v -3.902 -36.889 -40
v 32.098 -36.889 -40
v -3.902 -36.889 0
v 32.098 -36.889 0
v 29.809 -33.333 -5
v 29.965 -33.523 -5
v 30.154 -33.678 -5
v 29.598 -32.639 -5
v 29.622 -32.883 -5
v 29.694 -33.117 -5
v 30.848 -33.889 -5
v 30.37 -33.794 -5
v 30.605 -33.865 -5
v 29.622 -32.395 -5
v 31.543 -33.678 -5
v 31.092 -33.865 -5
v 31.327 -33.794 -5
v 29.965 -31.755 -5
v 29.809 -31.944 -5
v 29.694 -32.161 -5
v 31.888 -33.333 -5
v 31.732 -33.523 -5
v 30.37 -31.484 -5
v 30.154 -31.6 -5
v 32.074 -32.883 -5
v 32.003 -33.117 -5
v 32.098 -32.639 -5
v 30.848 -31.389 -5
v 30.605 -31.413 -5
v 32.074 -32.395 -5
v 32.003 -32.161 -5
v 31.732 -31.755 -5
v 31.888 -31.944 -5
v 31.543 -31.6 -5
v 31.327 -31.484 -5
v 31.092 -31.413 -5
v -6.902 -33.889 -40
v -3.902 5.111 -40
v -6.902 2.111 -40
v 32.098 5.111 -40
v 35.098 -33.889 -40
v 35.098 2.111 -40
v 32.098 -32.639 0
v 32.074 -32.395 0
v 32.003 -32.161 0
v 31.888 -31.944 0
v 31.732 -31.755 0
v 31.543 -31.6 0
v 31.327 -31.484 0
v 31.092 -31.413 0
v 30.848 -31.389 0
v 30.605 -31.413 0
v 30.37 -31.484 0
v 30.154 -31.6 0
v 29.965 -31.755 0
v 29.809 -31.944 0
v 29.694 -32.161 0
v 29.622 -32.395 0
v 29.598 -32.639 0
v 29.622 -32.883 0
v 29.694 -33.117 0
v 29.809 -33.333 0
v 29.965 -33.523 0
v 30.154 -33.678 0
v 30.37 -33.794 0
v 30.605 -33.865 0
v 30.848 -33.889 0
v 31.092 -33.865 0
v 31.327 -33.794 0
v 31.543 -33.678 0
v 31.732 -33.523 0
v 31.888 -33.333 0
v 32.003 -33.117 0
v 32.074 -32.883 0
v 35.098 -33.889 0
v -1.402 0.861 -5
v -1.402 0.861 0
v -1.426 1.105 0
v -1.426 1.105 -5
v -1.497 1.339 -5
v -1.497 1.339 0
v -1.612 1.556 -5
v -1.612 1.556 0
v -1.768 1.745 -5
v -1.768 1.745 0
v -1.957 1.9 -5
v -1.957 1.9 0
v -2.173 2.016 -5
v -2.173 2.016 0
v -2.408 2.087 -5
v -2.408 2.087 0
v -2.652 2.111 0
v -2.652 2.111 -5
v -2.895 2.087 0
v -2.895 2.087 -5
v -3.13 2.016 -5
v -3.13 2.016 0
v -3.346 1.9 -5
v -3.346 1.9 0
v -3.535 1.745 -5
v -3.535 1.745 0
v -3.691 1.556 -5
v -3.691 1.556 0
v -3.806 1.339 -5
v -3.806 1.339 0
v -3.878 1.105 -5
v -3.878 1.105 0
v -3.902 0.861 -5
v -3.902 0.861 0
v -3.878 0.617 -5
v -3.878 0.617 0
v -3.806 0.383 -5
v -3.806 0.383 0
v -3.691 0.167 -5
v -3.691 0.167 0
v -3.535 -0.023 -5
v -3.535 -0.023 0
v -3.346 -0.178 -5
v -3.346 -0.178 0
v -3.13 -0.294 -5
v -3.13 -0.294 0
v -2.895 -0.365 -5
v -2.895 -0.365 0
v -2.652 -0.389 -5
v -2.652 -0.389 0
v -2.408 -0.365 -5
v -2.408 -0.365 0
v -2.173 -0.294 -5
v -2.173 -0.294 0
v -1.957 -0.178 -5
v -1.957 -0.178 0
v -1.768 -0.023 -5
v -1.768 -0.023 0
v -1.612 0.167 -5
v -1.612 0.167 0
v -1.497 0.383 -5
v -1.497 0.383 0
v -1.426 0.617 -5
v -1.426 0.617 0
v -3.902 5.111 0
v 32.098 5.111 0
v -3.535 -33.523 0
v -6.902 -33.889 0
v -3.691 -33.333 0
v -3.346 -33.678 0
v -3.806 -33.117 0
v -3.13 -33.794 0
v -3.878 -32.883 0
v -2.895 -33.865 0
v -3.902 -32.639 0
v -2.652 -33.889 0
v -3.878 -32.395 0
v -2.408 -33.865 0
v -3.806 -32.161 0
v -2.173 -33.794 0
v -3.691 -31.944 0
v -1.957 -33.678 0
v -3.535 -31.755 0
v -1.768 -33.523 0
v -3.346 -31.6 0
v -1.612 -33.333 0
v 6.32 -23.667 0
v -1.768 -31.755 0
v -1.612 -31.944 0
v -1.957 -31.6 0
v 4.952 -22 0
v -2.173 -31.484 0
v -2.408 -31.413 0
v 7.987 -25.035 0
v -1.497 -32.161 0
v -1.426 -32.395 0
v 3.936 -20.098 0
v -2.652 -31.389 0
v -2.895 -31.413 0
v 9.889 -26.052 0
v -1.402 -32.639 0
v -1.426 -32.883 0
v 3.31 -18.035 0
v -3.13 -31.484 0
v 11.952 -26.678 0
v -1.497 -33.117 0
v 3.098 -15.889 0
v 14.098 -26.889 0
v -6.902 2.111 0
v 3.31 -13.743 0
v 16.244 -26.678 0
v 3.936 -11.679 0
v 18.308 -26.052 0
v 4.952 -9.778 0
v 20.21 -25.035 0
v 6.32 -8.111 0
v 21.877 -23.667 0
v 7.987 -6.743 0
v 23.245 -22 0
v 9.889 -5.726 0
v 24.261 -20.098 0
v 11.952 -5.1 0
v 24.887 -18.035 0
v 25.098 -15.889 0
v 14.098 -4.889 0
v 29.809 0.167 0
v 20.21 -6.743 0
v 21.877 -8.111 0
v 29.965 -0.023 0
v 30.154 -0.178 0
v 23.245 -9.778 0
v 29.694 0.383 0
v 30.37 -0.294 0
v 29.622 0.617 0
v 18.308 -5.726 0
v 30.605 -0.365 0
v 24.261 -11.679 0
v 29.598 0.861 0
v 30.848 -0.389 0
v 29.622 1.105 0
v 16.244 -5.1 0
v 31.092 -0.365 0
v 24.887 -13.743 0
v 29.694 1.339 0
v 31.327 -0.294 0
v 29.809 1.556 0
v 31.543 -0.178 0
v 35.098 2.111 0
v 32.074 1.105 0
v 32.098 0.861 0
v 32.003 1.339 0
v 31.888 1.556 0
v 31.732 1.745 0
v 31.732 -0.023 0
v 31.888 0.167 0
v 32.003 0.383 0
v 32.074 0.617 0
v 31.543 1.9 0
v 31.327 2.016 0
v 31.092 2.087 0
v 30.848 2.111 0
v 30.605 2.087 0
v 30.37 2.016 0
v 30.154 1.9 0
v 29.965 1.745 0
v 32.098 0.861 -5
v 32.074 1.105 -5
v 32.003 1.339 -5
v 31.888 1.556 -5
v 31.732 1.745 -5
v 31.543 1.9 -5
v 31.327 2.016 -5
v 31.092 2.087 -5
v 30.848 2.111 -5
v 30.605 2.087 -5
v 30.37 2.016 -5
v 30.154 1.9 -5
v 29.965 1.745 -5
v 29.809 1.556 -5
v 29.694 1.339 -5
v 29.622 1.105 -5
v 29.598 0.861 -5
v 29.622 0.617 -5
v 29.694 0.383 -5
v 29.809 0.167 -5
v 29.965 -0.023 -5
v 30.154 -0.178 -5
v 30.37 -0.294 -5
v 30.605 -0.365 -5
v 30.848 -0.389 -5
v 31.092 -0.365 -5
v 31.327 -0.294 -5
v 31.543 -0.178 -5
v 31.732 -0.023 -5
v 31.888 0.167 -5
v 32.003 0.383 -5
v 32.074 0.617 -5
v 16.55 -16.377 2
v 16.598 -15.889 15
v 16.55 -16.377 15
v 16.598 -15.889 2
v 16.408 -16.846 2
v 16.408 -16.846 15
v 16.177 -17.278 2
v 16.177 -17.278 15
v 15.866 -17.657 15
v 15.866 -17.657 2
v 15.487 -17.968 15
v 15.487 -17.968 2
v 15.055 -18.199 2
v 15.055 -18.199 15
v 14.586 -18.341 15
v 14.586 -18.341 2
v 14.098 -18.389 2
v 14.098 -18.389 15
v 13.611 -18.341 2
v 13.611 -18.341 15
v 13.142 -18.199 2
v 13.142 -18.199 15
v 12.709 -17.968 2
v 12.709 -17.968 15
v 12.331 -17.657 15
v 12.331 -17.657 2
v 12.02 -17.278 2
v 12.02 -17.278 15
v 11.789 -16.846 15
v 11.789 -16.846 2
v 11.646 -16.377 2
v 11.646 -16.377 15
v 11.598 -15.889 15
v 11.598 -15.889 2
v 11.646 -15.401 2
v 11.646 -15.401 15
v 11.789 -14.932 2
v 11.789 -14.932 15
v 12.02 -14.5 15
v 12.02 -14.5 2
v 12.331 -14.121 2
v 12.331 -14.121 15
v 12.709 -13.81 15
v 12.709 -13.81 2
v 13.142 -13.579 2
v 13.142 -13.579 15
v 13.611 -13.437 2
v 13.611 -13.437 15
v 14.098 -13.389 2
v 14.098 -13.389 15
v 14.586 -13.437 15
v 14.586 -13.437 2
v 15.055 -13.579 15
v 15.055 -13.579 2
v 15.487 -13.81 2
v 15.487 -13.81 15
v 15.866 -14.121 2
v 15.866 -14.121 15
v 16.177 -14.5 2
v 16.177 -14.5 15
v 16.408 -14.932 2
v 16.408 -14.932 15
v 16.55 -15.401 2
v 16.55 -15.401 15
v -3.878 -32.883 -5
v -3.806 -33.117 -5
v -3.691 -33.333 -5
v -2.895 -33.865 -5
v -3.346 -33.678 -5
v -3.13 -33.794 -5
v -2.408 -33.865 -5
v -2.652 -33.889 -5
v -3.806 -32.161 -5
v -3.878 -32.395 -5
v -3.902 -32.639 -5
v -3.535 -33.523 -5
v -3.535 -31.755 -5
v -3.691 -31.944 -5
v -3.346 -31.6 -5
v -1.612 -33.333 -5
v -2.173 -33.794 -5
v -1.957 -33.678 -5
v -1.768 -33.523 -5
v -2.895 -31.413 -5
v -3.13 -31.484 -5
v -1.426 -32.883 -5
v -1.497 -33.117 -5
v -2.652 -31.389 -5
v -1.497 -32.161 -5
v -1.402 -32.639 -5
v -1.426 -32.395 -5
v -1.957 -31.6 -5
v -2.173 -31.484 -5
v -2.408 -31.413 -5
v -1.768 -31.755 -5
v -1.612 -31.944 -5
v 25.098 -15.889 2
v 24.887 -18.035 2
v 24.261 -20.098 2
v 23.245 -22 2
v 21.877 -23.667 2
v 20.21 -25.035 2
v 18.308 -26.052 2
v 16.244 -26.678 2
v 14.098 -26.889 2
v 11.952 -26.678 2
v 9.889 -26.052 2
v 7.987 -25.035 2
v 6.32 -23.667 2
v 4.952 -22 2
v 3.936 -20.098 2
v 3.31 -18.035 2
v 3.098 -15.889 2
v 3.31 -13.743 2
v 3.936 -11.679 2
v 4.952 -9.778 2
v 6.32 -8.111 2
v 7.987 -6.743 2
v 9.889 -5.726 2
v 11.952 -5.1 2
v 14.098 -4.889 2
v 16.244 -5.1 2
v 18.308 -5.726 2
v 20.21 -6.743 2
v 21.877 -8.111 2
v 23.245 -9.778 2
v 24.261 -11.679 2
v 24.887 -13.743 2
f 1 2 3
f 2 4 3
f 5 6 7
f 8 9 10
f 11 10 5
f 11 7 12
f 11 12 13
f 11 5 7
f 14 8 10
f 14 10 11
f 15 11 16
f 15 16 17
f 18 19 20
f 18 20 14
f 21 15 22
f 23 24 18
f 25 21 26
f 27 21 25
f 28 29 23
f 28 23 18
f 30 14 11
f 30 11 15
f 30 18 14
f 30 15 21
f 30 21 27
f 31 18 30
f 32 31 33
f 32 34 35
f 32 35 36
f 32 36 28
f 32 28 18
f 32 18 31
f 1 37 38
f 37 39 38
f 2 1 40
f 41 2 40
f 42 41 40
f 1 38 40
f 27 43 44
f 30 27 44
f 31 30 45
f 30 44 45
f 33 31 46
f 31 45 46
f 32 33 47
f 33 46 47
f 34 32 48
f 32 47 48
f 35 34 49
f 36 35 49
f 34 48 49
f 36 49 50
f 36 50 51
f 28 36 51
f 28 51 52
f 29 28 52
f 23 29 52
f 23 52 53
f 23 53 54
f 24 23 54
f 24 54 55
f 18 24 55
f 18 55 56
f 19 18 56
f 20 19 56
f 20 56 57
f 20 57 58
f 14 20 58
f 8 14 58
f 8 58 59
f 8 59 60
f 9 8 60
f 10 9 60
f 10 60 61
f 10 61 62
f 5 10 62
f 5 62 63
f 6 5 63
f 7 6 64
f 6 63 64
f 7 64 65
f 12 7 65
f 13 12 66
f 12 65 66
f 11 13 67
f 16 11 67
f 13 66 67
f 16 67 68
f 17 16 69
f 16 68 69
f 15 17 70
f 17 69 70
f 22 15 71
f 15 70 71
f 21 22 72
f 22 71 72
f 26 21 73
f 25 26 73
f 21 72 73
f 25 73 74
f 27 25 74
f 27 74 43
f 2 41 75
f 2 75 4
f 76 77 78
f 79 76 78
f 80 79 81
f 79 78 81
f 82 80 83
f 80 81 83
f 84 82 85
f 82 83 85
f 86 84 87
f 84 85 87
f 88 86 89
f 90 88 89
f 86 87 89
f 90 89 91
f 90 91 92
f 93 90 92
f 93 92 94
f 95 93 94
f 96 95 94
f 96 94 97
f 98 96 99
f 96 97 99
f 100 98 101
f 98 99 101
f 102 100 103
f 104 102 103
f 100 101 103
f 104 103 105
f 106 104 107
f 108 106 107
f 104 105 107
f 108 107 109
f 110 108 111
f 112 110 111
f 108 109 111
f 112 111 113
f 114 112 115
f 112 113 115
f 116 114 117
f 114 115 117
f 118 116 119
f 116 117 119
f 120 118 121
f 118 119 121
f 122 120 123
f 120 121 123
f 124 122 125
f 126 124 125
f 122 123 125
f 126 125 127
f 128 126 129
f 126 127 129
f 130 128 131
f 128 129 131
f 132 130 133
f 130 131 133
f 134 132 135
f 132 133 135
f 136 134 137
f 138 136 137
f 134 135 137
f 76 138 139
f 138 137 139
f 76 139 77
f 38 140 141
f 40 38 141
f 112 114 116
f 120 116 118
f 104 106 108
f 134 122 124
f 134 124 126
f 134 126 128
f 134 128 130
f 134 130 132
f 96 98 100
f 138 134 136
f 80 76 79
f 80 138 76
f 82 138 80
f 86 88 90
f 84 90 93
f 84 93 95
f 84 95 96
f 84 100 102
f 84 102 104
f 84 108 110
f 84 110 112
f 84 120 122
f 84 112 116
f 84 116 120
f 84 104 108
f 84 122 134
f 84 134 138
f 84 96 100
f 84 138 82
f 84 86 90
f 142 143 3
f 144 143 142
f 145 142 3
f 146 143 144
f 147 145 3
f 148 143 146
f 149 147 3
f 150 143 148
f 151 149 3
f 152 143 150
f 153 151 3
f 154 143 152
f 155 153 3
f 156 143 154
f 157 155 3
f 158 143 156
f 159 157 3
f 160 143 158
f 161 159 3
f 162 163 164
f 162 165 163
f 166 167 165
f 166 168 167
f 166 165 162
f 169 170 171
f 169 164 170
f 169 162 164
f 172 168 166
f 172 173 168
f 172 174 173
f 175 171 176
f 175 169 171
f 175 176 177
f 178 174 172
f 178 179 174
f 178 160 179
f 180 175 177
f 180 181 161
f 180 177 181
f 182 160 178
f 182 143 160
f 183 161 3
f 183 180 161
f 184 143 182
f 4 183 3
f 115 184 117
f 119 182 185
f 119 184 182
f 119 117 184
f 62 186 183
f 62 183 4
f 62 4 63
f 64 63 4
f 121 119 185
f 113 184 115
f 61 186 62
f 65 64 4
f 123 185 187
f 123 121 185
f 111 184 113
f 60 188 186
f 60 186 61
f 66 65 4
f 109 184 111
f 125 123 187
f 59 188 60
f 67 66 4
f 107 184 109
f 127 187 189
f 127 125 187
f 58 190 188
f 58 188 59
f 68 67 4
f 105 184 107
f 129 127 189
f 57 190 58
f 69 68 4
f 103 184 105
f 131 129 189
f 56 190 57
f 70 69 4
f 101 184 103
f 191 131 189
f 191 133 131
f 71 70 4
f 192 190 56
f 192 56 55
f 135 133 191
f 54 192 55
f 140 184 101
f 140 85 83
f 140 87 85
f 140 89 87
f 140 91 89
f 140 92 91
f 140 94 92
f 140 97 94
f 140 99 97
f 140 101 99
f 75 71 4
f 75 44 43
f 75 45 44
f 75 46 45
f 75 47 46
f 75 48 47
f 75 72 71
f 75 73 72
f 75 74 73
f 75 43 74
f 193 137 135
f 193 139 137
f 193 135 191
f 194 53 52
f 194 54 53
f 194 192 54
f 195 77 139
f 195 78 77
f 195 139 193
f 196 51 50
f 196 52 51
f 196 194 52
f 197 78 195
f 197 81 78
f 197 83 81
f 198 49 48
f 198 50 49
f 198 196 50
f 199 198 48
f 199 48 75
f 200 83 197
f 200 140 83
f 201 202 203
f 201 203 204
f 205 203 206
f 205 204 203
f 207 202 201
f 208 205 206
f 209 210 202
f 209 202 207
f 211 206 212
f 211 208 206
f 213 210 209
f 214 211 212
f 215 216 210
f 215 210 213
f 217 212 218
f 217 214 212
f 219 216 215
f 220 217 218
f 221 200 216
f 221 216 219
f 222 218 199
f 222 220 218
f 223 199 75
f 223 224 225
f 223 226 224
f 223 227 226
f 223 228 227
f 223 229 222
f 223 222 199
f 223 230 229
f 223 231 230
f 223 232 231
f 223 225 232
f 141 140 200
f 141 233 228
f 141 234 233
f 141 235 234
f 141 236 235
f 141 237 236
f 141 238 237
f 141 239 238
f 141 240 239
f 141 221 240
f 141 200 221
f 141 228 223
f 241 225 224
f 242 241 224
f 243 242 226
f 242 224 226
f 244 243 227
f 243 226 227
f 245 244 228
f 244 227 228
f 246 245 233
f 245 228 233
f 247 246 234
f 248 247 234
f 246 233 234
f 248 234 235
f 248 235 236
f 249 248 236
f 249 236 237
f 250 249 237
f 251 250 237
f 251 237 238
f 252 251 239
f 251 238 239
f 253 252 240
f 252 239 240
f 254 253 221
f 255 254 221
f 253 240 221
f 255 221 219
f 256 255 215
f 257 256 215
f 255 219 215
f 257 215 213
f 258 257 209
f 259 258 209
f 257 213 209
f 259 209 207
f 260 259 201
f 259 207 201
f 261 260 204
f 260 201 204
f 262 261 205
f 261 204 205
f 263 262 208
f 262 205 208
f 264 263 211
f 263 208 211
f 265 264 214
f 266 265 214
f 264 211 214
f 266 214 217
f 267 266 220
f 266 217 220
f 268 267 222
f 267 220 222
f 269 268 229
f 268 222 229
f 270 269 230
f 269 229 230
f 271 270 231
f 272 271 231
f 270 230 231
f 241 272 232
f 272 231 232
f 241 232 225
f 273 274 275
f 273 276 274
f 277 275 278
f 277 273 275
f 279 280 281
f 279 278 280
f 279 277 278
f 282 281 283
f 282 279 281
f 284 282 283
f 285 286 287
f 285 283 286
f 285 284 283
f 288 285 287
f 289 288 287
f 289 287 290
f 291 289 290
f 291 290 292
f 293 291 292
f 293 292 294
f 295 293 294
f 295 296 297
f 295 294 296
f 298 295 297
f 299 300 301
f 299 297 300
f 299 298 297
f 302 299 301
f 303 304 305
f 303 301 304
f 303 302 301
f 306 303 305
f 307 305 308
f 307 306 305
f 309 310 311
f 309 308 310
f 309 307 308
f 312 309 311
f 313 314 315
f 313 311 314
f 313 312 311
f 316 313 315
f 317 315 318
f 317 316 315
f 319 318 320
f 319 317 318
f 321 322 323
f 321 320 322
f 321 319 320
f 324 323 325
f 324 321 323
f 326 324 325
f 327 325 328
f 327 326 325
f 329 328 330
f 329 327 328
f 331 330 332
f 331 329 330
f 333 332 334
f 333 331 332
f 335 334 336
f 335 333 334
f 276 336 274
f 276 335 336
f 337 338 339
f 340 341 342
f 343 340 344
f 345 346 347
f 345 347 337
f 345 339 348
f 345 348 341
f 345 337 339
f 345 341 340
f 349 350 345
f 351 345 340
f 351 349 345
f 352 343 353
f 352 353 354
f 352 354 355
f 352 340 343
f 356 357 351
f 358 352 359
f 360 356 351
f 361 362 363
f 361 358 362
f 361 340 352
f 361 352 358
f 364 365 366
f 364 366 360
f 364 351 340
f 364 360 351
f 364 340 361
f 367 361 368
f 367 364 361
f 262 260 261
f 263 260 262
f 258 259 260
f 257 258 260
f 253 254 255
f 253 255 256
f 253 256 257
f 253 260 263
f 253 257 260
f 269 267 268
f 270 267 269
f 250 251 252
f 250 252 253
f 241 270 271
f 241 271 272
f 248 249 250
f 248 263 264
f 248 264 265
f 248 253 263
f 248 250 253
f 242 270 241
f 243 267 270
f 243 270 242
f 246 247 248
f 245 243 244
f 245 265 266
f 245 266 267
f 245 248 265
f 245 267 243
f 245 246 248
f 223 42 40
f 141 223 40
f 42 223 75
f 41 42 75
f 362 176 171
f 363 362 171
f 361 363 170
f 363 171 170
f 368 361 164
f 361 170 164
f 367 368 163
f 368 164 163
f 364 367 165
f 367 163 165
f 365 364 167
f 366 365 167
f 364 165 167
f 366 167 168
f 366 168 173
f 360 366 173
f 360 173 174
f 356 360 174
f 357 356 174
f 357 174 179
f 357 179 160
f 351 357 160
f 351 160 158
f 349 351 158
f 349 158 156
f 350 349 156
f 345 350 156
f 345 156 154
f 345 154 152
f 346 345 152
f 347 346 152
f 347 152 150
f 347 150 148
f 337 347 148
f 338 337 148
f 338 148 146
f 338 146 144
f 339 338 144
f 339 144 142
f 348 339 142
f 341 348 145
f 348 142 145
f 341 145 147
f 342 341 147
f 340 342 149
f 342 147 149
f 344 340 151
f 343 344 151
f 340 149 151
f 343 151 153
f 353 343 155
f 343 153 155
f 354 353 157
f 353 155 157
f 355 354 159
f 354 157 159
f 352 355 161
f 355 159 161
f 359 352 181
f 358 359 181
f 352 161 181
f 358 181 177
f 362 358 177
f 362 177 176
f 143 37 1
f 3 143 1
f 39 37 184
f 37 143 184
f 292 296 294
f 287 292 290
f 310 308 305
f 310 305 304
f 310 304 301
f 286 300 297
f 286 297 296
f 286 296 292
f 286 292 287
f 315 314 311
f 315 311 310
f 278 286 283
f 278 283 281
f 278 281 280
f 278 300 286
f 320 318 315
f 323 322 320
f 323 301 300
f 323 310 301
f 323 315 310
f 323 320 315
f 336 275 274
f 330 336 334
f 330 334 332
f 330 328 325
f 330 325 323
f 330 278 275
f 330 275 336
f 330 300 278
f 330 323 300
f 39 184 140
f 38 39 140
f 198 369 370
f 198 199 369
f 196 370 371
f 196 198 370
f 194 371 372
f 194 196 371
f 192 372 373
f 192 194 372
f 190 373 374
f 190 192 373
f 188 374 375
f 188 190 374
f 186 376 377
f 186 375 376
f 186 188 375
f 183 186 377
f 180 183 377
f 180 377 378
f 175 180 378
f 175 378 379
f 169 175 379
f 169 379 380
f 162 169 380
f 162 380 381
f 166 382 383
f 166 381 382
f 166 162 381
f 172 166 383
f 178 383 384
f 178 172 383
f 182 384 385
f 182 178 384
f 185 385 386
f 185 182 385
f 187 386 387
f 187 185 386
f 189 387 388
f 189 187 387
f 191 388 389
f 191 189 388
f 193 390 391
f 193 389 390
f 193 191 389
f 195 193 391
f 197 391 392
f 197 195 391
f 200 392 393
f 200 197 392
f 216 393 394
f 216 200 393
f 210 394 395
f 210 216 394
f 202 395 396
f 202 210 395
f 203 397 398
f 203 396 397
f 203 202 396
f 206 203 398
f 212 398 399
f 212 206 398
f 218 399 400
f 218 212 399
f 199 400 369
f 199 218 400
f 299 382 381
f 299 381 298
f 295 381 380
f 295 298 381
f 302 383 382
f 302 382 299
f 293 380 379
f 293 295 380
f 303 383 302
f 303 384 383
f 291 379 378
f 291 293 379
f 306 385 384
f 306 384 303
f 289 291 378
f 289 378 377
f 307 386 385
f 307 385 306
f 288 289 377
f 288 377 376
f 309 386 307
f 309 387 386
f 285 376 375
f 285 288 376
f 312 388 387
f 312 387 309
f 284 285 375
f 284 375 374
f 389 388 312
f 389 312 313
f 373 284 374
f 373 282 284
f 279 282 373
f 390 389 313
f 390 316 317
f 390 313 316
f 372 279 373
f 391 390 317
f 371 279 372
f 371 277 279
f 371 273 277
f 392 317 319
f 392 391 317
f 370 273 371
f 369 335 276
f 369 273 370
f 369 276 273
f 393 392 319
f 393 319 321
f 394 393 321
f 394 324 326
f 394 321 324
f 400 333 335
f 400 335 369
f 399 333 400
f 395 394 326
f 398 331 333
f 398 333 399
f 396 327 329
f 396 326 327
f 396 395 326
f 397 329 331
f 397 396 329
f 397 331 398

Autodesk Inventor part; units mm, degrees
ref_plane "YZ Plane" through (0, 0, 0) normal (1, 0, 0) x (0, 1, 0)
ref_plane "XZ Plane" through (0, 0, 0) normal (0, 1, 0) x (-1, 0, 0)
ref_plane "XY Plane" through (0, 0, 0) normal (0, 0, 1) x (1, 0, 0)
sketch "Sketch1" plane through (0, 0, 0) normal (0, 0, 1) x (1, 0, 0)
  line L0 (-3.9016, 5.1111) -> (32.0984, 5.1111)
  line L1 (35.0984, 2.1111) -> (35.0984, -33.8889)
  line L2 (32.0984, -36.8889) -> (-3.9016, -36.8889)
  line L3 (-6.9016, -33.8889) -> (-6.9016, 2.1111)
  circle A0 centre (14.0984, -15.8889) radius 11
  circle A1 centre (14.0984, -15.8889) radius 2.5
  line L4 (35.0984, 2.1111) -> (32.0984, 5.1111)
  line L5 (-6.9016, 2.1111) -> (-3.9016, 5.1111)
  line L6 (-6.9016, -33.8889) -> (-3.9016, -36.8889)
  line L7 (35.0984, -33.8889) -> (32.0984, -36.8889)
  circle A2 centre (30.8484, -32.6389) radius 1.25
  circle A3 centre (-2.6516, -32.6389) radius 1.25
  circle A4 centre (-2.6516, 0.8611) radius 1.25
  circle A5 centre (30.8484, 0.8611) radius 1.25
  point P0 (0, 0)
extrude "Extrusion1" add sketch "Sketch1" along normal blind 15 contours A1
extrude "Extrusion2" add sketch "Sketch1" along normal blind 2 contours A0
extrude "Extrusion3" add sketch "Sketch1" against normal blind 40 contours L0 L4 L1 L7 L2 L6 L3 L5 | A0 | A1 | A2 | A3 | A4 | A5
extrude "Extrusion4" cut sketch "Sketch1" against normal blind 5 contours A5
extrude "Extrusion5" cut sketch "Sketch1" against normal blind 5 contours A2
extrude "Extrusion6" cut sketch "Sketch1" against normal blind 5 contours A3
extrude "Extrusion7" cut sketch "Sketch1" against normal blind 5 contours A4
properties part number "motor" material "Iron, Malleable"
